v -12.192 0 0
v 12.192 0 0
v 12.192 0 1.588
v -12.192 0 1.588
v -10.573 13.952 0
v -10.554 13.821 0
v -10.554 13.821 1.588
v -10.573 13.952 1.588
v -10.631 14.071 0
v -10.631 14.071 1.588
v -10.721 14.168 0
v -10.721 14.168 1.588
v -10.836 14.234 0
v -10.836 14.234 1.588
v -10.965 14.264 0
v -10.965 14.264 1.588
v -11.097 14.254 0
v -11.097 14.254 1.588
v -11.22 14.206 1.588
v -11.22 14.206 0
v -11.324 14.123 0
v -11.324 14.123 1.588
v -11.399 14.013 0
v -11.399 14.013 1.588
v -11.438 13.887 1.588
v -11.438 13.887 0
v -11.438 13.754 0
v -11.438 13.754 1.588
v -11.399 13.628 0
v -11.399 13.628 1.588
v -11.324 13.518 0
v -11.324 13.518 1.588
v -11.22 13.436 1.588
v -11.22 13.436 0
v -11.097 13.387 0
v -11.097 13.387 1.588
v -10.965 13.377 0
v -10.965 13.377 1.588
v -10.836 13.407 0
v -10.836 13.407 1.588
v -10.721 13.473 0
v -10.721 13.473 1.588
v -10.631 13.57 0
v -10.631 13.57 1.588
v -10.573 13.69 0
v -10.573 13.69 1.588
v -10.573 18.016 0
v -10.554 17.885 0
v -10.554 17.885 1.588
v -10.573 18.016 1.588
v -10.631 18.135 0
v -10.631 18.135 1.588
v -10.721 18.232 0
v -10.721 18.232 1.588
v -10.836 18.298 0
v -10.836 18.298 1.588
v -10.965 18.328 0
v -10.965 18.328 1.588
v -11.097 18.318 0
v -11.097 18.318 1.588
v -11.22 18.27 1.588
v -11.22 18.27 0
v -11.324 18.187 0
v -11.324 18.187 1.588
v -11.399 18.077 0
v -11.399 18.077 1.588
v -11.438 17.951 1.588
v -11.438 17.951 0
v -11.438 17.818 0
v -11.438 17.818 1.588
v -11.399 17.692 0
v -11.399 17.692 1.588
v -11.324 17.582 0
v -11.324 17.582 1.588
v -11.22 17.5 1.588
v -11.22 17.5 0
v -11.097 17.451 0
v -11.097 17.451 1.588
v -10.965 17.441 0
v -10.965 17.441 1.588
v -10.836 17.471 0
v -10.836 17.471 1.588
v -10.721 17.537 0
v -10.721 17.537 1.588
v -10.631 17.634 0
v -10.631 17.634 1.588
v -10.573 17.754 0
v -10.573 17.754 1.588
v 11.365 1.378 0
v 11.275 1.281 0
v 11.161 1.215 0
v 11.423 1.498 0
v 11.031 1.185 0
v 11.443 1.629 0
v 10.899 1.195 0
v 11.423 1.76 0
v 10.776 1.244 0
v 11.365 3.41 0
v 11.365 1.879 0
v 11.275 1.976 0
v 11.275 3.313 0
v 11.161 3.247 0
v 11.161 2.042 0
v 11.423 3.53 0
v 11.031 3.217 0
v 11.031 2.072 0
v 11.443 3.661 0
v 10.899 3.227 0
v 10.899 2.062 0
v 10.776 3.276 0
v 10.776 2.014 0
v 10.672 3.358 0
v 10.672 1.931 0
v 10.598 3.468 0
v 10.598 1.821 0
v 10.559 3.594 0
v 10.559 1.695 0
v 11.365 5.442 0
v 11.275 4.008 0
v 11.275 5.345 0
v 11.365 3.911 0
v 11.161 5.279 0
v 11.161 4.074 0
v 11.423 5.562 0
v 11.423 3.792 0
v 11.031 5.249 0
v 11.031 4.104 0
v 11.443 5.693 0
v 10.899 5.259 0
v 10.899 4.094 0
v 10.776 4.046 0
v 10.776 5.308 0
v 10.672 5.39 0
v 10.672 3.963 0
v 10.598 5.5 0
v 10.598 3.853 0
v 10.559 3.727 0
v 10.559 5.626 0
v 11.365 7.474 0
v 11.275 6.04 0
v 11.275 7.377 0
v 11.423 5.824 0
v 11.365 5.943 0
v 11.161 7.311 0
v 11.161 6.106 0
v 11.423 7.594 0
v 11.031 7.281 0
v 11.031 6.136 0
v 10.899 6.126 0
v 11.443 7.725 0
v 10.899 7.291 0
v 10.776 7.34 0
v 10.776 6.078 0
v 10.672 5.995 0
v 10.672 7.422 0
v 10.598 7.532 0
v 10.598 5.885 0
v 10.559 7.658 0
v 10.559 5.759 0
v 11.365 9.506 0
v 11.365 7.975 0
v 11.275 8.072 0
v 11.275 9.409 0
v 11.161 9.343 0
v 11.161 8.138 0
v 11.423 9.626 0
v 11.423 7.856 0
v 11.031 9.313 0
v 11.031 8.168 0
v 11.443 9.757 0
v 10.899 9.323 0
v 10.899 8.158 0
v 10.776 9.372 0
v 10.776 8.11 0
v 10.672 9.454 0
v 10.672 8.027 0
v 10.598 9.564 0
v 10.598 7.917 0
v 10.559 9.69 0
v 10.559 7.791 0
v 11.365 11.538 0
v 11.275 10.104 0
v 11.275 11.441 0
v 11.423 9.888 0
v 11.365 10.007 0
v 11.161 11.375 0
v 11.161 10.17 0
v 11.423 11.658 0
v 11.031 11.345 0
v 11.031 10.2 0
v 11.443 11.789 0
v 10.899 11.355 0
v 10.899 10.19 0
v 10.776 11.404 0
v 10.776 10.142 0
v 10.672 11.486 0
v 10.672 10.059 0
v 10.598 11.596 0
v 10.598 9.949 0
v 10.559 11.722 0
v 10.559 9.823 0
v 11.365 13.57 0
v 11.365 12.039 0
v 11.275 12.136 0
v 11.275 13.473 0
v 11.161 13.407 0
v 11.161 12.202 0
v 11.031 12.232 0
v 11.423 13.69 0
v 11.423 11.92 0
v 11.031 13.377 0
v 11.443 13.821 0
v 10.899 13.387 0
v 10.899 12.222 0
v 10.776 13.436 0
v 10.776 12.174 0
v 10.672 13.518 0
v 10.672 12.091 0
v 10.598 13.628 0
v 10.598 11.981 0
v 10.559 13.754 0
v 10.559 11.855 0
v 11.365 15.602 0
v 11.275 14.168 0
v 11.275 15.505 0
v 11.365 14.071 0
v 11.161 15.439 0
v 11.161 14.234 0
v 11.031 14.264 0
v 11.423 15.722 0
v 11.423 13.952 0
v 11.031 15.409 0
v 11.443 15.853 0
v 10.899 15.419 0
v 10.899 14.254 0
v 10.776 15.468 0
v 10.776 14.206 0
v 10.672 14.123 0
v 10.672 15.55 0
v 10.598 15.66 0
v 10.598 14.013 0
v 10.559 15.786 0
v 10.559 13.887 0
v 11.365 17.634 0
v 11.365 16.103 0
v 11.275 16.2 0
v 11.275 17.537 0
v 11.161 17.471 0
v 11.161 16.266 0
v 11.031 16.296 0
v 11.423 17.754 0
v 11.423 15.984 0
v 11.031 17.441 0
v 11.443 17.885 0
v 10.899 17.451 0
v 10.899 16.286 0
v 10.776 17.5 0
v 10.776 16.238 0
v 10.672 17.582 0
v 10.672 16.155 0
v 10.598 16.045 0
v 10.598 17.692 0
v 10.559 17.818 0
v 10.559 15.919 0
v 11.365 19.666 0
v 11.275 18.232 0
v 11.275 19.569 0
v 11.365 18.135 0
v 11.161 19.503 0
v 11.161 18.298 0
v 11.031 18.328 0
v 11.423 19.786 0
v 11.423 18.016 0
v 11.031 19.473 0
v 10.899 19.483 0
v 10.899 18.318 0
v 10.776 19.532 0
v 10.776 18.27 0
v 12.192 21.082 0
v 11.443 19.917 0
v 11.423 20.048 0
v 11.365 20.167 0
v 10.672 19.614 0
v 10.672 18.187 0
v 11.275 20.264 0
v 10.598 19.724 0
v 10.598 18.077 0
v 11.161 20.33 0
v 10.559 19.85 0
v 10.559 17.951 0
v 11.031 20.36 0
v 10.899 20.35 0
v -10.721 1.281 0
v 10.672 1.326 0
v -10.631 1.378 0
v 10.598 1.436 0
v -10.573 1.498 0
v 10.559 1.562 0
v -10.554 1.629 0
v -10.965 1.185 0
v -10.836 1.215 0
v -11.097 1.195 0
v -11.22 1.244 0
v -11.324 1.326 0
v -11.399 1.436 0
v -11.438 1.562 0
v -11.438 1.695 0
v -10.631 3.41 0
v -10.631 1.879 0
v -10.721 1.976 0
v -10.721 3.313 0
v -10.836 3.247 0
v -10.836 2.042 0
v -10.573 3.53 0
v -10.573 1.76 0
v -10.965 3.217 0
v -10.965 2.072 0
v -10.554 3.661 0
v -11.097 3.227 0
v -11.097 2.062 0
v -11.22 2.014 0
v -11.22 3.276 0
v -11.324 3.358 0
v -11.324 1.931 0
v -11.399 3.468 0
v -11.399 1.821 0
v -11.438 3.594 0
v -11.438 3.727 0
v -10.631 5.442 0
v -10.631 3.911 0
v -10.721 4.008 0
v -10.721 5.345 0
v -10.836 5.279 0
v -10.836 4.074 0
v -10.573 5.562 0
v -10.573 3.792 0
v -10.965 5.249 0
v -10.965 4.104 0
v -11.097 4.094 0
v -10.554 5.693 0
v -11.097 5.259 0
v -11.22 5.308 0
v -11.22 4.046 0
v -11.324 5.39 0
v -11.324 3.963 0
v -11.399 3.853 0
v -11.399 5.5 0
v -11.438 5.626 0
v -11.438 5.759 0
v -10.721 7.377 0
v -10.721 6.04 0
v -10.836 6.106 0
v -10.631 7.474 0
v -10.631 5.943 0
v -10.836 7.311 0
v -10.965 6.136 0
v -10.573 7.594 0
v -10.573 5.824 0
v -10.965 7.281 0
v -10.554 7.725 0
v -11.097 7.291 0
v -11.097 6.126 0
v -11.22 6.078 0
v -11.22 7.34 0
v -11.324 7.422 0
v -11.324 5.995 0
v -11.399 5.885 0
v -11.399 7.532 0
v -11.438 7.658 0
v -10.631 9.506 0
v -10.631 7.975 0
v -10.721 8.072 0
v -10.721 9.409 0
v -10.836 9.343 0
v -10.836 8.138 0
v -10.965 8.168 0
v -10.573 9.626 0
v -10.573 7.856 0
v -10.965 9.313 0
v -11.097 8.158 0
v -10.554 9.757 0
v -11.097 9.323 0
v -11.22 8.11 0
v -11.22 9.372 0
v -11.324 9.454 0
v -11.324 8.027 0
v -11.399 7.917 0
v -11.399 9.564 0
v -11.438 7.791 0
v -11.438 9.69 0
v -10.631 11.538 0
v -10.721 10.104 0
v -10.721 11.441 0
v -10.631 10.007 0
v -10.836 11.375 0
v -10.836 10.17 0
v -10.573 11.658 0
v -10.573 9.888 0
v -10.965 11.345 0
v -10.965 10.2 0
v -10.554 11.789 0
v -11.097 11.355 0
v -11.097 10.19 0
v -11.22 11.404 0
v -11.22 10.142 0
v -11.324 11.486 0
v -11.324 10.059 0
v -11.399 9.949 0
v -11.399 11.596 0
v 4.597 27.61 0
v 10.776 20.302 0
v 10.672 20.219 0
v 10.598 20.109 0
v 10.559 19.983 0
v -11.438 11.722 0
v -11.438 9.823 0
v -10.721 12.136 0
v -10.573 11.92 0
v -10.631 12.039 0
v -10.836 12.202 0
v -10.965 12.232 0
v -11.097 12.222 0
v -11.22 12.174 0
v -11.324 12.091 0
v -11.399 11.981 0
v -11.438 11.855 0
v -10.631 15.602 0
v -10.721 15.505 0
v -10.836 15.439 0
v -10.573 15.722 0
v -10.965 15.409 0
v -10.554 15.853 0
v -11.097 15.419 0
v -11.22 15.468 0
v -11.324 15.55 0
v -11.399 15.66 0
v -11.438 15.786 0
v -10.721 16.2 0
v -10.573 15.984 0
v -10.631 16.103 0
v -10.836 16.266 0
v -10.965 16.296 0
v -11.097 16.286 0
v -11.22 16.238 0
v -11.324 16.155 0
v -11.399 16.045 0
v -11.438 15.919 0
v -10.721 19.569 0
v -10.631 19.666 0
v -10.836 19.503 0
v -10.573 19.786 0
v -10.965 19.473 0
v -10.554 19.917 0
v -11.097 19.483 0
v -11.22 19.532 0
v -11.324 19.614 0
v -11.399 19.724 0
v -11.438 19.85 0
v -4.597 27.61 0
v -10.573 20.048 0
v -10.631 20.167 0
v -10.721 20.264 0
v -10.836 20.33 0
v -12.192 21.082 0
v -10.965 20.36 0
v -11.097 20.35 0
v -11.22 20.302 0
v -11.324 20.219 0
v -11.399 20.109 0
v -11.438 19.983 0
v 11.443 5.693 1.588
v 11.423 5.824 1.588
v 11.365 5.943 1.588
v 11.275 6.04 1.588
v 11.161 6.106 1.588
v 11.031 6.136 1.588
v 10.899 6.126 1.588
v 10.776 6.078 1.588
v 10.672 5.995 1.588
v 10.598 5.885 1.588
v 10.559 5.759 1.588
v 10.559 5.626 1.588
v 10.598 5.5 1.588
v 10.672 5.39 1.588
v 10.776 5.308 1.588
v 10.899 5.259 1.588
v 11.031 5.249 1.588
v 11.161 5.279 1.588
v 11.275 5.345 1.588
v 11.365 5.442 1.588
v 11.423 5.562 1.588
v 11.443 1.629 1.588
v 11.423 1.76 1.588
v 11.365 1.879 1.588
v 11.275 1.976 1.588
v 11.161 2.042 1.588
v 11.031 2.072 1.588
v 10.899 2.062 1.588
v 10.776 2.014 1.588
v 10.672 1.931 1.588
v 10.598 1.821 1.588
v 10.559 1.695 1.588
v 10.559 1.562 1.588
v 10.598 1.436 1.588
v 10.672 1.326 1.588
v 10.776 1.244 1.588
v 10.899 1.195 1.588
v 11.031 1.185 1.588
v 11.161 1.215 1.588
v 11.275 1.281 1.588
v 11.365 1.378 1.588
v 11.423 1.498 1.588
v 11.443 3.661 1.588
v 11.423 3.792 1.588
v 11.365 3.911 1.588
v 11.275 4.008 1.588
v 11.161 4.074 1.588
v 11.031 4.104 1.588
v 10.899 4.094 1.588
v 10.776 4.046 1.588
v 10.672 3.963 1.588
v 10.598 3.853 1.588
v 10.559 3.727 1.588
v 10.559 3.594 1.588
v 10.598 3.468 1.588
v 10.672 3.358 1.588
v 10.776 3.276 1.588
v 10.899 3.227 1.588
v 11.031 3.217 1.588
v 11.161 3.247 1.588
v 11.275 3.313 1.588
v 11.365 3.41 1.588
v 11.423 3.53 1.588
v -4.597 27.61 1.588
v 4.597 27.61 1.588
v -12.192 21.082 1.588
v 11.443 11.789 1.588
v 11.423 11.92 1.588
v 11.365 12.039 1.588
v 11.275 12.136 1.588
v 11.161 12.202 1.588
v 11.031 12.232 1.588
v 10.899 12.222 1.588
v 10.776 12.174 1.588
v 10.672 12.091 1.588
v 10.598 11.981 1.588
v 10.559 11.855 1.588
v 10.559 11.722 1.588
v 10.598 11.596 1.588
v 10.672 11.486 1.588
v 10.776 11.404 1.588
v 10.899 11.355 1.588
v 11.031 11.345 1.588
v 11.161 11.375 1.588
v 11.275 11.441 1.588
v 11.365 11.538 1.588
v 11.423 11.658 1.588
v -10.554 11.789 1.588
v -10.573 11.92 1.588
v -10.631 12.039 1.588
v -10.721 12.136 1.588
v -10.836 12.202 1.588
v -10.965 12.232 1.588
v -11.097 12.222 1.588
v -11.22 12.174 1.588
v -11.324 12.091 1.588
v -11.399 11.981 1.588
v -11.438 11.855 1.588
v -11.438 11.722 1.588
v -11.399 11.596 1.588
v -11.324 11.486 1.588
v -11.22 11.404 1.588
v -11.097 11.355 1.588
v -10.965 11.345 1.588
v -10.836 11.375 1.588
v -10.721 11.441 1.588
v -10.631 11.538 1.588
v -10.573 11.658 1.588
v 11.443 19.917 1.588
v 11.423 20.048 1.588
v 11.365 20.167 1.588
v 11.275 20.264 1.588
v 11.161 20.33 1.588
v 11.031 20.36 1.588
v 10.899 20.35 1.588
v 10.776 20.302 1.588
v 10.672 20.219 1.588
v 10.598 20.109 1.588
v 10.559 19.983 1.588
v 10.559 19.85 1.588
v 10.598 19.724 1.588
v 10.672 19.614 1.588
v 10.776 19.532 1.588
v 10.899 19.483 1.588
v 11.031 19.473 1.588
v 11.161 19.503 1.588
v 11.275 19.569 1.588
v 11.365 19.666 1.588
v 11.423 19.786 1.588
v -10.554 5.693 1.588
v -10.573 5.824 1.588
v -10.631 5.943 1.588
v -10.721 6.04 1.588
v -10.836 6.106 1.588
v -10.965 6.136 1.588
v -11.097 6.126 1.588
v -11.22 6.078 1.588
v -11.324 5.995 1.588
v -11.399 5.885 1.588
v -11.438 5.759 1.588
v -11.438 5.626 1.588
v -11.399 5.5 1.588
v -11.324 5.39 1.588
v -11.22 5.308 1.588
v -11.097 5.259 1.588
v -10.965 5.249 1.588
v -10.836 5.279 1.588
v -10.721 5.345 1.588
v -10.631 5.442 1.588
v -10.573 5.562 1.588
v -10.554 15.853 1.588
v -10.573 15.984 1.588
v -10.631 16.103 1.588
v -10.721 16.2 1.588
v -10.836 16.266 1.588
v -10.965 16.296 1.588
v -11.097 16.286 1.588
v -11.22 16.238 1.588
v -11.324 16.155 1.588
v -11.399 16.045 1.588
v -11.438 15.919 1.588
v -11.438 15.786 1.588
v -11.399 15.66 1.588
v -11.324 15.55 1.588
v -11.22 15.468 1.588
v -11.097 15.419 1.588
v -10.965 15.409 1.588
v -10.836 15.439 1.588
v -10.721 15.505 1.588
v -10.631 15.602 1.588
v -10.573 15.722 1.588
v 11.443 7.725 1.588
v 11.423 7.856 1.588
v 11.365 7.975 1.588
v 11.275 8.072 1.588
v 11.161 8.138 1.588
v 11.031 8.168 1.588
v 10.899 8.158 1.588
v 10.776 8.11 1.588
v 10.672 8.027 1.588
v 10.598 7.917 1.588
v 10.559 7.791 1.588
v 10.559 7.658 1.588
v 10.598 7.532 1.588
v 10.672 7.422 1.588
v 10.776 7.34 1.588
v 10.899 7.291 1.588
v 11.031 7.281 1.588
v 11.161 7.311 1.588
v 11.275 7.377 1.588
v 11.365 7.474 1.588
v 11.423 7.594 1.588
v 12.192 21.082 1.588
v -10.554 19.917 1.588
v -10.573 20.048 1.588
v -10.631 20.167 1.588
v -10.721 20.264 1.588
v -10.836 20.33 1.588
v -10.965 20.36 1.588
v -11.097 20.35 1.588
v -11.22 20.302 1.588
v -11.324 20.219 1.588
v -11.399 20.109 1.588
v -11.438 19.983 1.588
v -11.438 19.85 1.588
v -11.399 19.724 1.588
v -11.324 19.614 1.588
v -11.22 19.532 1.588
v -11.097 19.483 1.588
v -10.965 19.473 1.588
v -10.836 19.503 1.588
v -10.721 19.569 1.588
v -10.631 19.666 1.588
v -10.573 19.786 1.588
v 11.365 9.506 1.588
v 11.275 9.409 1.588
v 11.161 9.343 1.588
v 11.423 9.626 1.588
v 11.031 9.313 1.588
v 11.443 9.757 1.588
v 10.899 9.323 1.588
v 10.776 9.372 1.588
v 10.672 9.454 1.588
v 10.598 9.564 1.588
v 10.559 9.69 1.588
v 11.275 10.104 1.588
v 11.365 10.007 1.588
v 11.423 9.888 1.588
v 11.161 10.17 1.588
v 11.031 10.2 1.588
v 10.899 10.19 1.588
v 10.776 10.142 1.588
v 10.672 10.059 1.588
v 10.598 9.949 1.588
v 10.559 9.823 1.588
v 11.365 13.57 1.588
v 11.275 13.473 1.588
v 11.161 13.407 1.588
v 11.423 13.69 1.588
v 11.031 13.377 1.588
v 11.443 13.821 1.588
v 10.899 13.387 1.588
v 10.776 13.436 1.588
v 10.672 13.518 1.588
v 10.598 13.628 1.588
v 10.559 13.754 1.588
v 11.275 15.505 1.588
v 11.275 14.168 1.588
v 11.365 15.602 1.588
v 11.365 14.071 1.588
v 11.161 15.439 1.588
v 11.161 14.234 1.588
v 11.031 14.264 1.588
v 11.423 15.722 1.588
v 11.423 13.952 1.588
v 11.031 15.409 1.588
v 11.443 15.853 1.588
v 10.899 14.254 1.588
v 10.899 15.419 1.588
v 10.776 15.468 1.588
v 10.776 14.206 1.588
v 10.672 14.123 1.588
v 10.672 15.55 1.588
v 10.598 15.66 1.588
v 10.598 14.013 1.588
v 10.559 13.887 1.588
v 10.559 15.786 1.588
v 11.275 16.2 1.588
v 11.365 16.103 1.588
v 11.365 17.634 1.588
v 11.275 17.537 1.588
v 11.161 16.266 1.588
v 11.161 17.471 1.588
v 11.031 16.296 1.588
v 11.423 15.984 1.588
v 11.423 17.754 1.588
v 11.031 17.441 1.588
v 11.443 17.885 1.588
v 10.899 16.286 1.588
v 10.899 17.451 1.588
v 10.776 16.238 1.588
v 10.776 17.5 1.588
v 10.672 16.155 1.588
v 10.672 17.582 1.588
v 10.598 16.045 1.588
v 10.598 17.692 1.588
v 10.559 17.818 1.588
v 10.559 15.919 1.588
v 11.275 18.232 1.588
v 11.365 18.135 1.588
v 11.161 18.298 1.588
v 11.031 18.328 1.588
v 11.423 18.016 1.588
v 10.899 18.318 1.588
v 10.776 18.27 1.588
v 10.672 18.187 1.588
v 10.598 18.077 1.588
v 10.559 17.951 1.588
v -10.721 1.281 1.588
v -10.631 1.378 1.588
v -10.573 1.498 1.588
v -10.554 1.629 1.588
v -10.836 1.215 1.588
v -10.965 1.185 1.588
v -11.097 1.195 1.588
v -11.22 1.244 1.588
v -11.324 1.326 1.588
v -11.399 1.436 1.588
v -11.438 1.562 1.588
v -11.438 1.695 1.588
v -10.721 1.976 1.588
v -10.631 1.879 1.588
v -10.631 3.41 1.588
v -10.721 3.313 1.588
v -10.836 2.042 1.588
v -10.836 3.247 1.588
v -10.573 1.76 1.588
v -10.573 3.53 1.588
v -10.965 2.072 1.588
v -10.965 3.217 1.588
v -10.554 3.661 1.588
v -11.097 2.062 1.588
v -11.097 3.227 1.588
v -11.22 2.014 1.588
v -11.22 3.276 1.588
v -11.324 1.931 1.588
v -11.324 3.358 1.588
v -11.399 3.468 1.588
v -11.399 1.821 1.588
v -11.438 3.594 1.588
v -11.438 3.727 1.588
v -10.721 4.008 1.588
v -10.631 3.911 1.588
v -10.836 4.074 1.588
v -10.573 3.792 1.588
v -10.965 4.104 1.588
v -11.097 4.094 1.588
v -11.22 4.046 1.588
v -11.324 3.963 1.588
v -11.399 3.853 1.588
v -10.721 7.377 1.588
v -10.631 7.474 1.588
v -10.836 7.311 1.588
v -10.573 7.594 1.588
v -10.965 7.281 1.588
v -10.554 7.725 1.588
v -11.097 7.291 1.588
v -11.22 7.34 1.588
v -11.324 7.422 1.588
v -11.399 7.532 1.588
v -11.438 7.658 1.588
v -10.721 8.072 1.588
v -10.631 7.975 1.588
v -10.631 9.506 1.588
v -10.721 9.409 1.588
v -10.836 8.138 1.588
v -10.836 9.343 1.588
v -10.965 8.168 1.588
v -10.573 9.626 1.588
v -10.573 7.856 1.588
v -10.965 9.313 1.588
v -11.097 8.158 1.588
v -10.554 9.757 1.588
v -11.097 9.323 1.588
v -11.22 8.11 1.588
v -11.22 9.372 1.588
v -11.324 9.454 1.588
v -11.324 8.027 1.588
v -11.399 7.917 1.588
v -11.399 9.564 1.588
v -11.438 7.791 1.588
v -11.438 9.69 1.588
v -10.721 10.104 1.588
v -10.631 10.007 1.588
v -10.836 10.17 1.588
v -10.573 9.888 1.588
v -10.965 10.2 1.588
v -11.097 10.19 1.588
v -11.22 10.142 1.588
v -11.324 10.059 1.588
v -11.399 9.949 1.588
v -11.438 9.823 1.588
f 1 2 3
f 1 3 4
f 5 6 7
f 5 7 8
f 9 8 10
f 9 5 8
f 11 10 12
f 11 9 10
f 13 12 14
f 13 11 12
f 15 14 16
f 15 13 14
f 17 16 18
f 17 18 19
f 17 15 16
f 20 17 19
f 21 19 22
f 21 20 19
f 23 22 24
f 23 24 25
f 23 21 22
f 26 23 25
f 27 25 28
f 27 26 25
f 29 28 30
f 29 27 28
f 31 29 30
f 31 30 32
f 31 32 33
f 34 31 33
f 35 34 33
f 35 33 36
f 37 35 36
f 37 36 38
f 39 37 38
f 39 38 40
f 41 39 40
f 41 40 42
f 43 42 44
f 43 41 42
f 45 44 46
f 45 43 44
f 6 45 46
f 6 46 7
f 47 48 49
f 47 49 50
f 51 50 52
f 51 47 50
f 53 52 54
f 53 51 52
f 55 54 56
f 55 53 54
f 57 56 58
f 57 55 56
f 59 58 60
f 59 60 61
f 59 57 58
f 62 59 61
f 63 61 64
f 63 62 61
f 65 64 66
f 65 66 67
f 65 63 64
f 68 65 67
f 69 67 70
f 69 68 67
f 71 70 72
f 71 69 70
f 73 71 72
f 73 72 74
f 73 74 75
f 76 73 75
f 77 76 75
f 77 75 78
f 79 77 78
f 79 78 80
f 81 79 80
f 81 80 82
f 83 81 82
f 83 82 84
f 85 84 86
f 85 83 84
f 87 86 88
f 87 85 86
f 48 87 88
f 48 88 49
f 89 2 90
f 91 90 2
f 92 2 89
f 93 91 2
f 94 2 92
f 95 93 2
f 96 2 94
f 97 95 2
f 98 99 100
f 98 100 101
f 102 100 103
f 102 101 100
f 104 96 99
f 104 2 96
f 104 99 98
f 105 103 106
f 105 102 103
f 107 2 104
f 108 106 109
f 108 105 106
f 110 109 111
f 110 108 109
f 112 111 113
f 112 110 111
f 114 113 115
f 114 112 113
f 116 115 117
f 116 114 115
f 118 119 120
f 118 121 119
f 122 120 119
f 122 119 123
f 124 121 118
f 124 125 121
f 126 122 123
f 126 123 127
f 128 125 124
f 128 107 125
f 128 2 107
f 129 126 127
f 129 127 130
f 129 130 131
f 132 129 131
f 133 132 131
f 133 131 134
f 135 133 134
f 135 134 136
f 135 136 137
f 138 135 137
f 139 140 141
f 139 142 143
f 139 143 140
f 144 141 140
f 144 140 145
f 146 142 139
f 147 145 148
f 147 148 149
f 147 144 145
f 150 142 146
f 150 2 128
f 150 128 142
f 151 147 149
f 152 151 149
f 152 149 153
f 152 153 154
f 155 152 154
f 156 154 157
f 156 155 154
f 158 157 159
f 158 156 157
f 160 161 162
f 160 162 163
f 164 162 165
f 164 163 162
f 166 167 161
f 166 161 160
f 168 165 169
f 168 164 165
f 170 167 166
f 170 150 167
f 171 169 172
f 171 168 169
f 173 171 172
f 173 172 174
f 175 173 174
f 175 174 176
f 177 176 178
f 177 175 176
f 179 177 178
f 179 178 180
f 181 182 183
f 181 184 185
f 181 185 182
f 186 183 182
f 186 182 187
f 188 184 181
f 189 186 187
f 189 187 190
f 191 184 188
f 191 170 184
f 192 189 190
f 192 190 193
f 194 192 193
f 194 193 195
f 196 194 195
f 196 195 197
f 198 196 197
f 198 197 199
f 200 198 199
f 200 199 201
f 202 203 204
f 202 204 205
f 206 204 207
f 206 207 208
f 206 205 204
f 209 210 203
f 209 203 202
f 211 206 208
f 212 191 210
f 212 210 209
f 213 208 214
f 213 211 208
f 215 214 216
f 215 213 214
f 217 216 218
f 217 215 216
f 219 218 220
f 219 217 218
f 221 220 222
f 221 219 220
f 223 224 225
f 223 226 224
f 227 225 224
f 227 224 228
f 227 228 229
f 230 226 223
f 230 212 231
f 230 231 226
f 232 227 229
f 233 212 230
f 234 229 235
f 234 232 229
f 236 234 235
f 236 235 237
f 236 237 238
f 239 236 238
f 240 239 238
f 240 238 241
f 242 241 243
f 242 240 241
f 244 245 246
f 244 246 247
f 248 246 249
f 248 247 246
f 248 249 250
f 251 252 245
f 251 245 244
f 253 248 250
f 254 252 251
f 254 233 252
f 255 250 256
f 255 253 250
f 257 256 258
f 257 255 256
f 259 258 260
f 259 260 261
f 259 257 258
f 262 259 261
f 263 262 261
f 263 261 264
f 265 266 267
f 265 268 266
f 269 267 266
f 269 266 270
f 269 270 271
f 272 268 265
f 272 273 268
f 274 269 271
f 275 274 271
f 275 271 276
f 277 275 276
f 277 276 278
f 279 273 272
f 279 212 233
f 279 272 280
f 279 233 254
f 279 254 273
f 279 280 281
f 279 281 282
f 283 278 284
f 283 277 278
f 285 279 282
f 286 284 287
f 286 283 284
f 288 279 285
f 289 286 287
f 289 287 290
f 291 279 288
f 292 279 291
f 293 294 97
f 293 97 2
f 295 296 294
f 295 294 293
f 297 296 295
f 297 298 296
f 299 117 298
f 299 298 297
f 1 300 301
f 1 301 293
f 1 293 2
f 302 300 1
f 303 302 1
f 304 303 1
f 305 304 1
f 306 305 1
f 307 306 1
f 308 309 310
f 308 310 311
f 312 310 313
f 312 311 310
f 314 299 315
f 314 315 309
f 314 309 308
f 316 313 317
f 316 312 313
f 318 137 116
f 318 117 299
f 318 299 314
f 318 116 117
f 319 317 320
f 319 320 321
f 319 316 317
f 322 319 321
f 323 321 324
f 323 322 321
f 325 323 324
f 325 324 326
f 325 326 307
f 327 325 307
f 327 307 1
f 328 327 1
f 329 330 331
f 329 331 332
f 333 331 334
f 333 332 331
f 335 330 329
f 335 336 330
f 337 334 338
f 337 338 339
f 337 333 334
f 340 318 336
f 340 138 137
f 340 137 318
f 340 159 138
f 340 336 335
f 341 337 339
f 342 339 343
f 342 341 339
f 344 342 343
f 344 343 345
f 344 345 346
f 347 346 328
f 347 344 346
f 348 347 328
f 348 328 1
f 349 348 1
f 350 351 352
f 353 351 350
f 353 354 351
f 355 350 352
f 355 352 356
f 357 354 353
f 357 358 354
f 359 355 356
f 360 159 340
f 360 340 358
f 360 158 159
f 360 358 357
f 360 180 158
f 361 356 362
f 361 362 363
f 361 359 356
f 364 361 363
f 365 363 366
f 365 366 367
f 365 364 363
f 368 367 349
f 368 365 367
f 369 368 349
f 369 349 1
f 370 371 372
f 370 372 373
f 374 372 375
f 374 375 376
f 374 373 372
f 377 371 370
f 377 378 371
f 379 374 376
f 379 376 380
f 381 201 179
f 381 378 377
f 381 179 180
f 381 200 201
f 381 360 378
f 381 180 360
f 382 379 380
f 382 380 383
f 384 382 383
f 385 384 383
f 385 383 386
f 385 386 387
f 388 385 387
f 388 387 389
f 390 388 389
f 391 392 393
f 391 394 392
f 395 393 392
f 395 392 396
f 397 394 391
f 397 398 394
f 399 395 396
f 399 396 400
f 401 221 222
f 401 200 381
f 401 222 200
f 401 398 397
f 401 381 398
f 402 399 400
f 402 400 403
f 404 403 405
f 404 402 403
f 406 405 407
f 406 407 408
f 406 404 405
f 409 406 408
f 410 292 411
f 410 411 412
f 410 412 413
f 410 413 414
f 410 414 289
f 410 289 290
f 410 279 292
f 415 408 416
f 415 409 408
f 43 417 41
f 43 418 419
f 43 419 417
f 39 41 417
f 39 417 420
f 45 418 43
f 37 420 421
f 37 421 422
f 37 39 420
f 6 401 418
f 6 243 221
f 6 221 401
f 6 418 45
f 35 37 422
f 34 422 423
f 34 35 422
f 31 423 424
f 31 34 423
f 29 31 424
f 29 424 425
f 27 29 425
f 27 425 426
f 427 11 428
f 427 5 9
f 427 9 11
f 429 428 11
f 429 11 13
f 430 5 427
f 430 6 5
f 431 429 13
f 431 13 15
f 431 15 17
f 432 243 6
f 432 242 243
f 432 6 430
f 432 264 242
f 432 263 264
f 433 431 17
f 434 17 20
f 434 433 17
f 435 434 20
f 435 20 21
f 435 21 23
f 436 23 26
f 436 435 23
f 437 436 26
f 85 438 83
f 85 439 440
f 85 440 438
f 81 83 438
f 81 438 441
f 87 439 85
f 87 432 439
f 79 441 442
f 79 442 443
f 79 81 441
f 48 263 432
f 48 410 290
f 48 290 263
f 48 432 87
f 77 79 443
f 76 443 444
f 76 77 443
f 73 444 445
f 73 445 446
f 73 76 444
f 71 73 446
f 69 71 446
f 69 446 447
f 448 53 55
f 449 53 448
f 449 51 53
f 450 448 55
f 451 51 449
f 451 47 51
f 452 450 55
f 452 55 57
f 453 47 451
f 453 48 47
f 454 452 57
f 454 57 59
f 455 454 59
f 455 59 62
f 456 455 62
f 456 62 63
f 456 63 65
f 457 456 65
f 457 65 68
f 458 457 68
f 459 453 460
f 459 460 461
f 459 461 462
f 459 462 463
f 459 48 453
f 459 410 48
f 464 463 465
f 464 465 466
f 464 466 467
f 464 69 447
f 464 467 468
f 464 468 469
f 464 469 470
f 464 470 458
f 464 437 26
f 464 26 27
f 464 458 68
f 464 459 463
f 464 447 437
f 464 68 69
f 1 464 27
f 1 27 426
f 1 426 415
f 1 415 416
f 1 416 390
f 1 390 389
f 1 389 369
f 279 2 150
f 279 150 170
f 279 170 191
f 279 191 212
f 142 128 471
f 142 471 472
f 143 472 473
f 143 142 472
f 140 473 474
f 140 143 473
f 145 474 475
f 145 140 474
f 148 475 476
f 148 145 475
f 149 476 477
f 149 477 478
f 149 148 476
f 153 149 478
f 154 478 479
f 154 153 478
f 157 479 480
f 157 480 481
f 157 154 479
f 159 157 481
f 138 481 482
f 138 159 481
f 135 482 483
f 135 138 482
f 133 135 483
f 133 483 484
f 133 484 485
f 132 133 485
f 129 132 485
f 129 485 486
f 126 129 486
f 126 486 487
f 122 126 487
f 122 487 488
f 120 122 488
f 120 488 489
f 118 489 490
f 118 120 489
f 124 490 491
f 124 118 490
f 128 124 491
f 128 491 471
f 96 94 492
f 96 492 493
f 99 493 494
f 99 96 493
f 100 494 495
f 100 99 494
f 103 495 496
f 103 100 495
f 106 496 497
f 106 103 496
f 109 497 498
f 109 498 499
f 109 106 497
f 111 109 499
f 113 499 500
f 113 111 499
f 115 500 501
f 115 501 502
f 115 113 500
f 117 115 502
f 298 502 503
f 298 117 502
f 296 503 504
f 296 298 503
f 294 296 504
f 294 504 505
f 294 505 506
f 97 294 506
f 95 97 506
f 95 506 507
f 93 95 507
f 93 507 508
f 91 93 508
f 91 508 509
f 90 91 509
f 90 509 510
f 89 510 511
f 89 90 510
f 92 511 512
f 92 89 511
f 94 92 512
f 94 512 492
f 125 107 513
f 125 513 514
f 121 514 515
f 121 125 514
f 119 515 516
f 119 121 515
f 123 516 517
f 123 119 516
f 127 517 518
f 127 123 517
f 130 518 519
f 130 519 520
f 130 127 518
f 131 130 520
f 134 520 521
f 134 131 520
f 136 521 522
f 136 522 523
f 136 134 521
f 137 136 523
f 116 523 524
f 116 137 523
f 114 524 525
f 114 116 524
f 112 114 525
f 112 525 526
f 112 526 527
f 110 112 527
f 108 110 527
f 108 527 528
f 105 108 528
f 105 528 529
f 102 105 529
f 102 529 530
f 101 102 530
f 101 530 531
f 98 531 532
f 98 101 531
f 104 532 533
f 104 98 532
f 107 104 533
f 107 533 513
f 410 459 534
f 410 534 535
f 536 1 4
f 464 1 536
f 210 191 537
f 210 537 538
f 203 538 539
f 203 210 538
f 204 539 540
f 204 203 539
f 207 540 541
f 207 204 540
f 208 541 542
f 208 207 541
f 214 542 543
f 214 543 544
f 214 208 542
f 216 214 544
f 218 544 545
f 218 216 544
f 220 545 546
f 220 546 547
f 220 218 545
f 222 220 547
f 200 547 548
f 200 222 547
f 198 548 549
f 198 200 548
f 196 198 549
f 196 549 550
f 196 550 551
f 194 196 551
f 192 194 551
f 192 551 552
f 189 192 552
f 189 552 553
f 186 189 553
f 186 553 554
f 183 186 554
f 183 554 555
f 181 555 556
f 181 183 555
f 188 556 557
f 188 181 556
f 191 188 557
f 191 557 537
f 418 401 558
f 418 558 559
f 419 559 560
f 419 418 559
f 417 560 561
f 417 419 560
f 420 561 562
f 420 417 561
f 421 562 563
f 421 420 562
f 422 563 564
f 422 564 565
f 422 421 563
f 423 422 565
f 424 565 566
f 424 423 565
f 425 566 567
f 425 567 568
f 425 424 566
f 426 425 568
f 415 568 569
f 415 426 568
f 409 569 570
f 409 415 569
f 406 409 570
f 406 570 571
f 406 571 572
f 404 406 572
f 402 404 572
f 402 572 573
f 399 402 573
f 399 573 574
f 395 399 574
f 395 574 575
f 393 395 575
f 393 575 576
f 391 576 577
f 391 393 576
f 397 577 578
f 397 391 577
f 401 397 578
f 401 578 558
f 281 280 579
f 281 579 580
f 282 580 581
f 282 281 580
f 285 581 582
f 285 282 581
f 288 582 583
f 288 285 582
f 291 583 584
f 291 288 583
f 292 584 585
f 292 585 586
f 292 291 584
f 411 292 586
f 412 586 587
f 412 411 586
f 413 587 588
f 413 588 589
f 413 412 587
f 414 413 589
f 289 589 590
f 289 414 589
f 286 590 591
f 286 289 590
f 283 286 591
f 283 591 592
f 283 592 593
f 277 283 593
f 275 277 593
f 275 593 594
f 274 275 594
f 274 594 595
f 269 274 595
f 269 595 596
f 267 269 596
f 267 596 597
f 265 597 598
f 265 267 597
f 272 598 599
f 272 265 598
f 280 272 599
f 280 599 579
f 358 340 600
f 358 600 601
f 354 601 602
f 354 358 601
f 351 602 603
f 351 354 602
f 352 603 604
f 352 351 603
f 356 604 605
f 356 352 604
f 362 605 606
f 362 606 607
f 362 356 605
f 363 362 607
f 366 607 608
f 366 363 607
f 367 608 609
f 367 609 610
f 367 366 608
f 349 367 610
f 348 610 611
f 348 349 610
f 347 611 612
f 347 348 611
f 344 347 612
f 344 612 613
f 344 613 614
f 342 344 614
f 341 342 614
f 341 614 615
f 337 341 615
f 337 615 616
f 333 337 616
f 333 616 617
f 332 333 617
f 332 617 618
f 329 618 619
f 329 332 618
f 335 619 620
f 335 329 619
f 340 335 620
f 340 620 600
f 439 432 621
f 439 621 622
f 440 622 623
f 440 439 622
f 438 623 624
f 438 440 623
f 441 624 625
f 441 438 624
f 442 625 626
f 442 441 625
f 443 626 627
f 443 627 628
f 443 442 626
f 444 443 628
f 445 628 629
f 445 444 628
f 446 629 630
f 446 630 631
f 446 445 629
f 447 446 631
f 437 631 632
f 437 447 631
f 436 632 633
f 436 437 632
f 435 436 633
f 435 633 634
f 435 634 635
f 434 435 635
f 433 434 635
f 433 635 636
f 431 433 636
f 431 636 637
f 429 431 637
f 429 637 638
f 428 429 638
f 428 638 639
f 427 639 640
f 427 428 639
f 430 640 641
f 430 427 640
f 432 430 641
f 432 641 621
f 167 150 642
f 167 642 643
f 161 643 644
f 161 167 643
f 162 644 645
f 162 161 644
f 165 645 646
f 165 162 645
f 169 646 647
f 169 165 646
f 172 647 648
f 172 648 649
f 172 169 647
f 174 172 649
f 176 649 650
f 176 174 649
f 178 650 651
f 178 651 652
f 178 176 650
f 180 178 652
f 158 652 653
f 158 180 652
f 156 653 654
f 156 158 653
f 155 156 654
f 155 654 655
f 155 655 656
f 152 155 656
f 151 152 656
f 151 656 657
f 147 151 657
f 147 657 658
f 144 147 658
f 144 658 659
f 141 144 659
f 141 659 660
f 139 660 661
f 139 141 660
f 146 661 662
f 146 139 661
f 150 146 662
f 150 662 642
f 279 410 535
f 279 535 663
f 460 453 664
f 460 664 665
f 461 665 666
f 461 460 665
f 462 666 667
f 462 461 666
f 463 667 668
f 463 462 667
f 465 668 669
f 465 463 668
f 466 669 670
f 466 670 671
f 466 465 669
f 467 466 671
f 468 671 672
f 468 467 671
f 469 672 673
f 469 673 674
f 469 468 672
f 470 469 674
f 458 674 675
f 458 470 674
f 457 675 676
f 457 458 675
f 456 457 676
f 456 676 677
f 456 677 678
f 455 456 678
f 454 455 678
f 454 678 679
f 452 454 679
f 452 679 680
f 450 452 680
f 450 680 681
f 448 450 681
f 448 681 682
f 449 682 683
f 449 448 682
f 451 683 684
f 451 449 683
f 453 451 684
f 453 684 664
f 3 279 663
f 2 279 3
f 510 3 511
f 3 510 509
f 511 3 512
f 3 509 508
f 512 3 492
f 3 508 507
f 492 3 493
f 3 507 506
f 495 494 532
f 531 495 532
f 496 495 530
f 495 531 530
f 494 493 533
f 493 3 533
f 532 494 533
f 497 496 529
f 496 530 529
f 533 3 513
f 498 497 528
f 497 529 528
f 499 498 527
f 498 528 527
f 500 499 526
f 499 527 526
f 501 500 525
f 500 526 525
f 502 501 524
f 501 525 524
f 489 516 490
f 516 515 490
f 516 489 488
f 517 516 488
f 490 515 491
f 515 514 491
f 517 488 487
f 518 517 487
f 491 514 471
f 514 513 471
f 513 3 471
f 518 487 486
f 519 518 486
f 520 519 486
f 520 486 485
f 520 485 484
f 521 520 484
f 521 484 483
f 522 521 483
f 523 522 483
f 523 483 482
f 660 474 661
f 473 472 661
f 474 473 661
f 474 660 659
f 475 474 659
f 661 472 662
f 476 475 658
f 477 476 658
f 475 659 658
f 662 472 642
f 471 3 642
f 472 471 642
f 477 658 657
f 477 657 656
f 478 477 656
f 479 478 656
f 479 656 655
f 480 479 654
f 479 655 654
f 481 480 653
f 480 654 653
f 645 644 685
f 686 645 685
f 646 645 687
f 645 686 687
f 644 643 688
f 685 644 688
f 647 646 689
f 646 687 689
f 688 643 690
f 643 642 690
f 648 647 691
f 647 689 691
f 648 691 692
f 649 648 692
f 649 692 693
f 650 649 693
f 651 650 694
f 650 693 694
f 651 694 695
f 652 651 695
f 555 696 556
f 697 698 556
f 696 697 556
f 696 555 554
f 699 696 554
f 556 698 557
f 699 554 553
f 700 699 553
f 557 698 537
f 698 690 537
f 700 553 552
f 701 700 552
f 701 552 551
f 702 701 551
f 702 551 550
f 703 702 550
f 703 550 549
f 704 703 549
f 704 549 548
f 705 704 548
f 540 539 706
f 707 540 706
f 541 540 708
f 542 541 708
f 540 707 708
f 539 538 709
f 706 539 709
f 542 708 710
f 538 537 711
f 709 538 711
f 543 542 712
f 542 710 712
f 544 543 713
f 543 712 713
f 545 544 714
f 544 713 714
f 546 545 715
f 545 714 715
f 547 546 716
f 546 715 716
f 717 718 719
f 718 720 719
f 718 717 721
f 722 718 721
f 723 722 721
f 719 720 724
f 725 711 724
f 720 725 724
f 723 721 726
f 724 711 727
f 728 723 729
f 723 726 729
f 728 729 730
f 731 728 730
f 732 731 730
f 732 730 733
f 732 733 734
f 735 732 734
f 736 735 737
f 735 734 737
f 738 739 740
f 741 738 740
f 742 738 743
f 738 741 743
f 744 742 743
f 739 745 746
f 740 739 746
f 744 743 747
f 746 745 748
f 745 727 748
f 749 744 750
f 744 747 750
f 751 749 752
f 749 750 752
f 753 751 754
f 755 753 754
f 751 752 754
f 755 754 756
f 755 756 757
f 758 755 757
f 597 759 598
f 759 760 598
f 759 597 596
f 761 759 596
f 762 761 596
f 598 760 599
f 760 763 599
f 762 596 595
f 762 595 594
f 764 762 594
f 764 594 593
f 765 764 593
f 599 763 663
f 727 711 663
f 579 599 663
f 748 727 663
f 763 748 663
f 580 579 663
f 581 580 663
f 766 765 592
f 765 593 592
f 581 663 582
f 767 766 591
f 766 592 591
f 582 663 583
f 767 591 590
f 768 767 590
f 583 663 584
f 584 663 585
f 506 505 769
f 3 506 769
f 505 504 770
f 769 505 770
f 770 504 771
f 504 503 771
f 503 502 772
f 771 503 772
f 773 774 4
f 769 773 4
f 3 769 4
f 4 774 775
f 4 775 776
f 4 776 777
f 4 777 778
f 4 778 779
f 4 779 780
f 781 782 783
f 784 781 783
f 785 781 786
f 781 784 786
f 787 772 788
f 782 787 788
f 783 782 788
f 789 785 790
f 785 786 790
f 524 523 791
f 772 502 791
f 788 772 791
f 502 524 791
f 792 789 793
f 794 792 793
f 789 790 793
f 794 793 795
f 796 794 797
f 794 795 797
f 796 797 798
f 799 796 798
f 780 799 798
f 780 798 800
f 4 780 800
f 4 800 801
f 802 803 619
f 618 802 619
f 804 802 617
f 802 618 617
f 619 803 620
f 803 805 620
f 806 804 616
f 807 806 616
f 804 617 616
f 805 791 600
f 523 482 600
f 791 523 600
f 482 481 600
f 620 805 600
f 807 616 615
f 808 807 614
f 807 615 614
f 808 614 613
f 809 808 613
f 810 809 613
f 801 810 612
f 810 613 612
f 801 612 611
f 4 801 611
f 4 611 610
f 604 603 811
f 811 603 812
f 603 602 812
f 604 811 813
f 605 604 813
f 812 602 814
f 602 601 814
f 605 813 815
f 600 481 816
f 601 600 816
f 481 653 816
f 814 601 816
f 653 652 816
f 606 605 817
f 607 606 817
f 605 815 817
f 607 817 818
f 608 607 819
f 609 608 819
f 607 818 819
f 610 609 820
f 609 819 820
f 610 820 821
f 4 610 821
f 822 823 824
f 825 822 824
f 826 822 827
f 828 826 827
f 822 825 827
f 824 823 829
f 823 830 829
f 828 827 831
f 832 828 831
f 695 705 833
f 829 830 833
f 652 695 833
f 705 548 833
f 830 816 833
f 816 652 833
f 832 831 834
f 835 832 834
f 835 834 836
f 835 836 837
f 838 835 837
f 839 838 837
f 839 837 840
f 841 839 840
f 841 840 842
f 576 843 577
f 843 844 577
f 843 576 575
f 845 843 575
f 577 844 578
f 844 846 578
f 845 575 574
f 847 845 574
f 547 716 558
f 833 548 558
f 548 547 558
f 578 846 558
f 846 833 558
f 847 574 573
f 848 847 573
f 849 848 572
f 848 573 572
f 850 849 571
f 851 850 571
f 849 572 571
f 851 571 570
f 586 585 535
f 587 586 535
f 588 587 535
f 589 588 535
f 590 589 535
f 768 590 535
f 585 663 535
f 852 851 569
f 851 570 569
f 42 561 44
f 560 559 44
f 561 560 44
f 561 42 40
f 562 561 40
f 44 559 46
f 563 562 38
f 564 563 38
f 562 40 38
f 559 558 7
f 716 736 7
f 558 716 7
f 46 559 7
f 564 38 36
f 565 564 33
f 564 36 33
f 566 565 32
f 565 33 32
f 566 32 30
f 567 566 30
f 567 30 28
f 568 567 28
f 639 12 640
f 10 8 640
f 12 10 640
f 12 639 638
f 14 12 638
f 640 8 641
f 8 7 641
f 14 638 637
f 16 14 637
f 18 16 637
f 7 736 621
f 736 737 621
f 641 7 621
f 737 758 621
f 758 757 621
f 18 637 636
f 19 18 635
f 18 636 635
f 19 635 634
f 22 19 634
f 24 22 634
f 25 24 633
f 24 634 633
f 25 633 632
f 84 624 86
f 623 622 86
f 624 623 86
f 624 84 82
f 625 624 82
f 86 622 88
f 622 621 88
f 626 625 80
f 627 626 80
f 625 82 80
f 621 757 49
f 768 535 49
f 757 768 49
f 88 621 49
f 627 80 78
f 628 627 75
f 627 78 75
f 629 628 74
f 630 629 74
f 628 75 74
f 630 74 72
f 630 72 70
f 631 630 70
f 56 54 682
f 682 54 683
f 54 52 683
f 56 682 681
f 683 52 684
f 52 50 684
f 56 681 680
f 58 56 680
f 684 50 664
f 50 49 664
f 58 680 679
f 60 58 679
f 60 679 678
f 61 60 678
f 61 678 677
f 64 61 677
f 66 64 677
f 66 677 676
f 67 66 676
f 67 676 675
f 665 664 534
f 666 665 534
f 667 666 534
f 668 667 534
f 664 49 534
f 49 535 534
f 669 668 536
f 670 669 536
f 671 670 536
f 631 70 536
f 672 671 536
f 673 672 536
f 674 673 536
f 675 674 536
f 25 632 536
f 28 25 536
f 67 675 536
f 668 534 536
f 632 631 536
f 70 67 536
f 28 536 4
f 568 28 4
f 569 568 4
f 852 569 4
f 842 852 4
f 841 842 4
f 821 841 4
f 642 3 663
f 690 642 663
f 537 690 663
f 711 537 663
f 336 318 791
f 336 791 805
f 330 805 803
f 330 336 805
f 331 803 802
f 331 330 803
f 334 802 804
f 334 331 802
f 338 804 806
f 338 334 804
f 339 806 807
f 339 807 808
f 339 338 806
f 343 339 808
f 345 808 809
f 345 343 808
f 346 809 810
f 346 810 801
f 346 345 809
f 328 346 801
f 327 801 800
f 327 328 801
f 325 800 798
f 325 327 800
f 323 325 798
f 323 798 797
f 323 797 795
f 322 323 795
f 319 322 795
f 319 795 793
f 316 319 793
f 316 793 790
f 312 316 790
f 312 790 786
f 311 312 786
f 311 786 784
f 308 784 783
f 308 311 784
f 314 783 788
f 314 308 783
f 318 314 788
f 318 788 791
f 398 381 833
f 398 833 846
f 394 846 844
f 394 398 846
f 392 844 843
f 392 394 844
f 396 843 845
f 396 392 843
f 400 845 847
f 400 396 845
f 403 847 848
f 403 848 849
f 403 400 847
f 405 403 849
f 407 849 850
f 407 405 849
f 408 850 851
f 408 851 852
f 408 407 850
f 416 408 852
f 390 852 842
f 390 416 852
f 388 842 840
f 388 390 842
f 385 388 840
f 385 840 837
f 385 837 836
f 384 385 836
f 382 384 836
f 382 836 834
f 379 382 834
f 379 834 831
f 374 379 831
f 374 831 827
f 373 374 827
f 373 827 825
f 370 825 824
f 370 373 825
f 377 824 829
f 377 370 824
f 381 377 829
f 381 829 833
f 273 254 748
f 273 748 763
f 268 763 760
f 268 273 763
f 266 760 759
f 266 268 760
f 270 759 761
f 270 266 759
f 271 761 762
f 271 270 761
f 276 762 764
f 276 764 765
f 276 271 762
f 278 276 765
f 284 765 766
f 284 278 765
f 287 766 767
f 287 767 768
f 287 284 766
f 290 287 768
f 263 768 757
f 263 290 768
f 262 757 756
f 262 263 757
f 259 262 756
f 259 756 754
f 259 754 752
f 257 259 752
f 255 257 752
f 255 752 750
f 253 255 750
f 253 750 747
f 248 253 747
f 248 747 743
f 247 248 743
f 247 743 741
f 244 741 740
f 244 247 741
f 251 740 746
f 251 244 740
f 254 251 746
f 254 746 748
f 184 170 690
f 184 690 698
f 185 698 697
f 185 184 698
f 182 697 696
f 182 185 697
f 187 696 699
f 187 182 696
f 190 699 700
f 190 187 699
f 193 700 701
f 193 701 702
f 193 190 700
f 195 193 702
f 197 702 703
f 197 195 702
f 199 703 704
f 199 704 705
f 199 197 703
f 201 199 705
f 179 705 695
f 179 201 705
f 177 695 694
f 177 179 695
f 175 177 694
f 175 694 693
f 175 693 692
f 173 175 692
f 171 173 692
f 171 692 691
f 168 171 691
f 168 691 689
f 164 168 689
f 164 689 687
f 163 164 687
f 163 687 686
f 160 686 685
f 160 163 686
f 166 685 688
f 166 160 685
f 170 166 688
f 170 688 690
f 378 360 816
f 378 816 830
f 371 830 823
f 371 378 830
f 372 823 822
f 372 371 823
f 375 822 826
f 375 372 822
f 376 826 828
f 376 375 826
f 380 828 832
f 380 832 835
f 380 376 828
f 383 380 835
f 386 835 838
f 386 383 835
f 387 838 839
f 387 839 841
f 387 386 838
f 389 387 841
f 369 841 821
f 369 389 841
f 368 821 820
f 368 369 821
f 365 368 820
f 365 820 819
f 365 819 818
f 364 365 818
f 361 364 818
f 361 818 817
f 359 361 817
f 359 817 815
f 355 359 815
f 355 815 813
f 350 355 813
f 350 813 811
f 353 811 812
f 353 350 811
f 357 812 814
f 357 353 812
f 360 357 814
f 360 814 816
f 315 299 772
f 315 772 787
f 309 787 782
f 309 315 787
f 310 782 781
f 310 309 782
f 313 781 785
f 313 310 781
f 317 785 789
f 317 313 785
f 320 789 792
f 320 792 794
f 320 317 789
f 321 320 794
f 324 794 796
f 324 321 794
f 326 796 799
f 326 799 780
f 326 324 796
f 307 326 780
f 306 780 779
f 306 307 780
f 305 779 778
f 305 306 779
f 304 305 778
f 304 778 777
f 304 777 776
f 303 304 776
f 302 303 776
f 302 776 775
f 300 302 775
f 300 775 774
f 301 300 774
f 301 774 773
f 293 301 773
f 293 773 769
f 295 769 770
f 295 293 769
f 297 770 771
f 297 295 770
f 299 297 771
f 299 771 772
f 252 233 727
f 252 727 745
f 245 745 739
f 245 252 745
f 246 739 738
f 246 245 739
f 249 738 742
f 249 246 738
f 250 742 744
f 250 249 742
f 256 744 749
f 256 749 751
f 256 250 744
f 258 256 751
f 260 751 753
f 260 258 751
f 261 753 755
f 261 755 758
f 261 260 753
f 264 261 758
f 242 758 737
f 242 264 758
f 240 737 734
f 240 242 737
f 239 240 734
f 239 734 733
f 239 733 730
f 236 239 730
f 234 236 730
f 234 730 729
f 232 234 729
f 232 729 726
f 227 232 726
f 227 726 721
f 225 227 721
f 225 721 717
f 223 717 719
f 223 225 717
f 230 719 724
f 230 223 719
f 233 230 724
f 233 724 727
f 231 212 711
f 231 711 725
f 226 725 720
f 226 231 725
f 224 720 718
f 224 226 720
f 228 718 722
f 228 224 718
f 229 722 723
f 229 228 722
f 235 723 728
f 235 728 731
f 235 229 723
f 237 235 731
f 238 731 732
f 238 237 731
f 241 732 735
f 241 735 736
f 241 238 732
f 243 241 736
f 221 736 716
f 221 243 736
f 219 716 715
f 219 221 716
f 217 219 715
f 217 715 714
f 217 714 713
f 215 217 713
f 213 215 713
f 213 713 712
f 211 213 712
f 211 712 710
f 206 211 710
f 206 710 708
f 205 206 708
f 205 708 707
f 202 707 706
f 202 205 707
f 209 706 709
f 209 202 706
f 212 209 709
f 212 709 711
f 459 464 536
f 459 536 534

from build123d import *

# Parameters (mm, degrees)
SKETCH1_R           = 0.4445
BOSS_EXTRUDE1_DEPTH = 1.5875


with BuildPart() as part:
    # Sketch1 → Boss-Extrude1 (new body)
    with BuildSketch(Plane.XY):
        Polygon((12.192, 0), (-12.192, 0), (-12.192, 21.082), (-4.5974, 27.6098), (4.5974, 27.6098), (12.192, 21.082), align=None)
        with Locations((-10.9982, 1.628621929)):
            Circle(SKETCH1_R, mode=Mode.SUBTRACT)
        with Locations((-10.9982, 3.660621929)):
            Circle(SKETCH1_R, mode=Mode.SUBTRACT)
        with Locations((-10.9982, 5.692621929)):
            Circle(SKETCH1_R, mode=Mode.SUBTRACT)
        with Locations((-10.9982, 7.724621929)):
            Circle(SKETCH1_R, mode=Mode.SUBTRACT)
        with Locations((-10.9982, 9.756621929)):
            Circle(SKETCH1_R, mode=Mode.SUBTRACT)
        with Locations((-10.9982, 11.788621929)):
            Circle(SKETCH1_R, mode=Mode.SUBTRACT)
        with Locations((-10.9982, 13.820621929)):
            Circle(SKETCH1_R, mode=Mode.SUBTRACT)
        with Locations((-10.9982, 15.852621929)):
            Circle(SKETCH1_R, mode=Mode.SUBTRACT)
        with Locations((-10.9982, 17.884621929)):
            Circle(SKETCH1_R, mode=Mode.SUBTRACT)
        with Locations((-10.9982, 19.916621929)):
            Circle(SKETCH1_R, mode=Mode.SUBTRACT)
        with Locations((10.9982, 19.916621929)):
            Circle(SKETCH1_R, mode=Mode.SUBTRACT)
        with Locations((10.9982, 17.884621929)):
            Circle(SKETCH1_R, mode=Mode.SUBTRACT)
        with Locations((10.9982, 15.852621929)):
            Circle(SKETCH1_R, mode=Mode.SUBTRACT)
        with Locations((10.9982, 13.820621929)):
            Circle(SKETCH1_R, mode=Mode.SUBTRACT)
        with Locations((10.9982, 11.788621929)):
            Circle(SKETCH1_R, mode=Mode.SUBTRACT)
        with Locations((10.9982, 9.756621929)):
            Circle(SKETCH1_R, mode=Mode.SUBTRACT)
        with Locations((10.9982, 7.724621929)):
            Circle(SKETCH1_R, mode=Mode.SUBTRACT)
        with Locations((10.9982, 5.692621929)):
            Circle(SKETCH1_R, mode=Mode.SUBTRACT)
        with Locations((10.9982, 3.660621929)):
            Circle(SKETCH1_R, mode=Mode.SUBTRACT)
        with Locations((10.9982, 1.628621929)):
            Circle(SKETCH1_R, mode=Mode.SUBTRACT)
    extrude(amount=BOSS_EXTRUDE1_DEPTH)


solid = part.part
